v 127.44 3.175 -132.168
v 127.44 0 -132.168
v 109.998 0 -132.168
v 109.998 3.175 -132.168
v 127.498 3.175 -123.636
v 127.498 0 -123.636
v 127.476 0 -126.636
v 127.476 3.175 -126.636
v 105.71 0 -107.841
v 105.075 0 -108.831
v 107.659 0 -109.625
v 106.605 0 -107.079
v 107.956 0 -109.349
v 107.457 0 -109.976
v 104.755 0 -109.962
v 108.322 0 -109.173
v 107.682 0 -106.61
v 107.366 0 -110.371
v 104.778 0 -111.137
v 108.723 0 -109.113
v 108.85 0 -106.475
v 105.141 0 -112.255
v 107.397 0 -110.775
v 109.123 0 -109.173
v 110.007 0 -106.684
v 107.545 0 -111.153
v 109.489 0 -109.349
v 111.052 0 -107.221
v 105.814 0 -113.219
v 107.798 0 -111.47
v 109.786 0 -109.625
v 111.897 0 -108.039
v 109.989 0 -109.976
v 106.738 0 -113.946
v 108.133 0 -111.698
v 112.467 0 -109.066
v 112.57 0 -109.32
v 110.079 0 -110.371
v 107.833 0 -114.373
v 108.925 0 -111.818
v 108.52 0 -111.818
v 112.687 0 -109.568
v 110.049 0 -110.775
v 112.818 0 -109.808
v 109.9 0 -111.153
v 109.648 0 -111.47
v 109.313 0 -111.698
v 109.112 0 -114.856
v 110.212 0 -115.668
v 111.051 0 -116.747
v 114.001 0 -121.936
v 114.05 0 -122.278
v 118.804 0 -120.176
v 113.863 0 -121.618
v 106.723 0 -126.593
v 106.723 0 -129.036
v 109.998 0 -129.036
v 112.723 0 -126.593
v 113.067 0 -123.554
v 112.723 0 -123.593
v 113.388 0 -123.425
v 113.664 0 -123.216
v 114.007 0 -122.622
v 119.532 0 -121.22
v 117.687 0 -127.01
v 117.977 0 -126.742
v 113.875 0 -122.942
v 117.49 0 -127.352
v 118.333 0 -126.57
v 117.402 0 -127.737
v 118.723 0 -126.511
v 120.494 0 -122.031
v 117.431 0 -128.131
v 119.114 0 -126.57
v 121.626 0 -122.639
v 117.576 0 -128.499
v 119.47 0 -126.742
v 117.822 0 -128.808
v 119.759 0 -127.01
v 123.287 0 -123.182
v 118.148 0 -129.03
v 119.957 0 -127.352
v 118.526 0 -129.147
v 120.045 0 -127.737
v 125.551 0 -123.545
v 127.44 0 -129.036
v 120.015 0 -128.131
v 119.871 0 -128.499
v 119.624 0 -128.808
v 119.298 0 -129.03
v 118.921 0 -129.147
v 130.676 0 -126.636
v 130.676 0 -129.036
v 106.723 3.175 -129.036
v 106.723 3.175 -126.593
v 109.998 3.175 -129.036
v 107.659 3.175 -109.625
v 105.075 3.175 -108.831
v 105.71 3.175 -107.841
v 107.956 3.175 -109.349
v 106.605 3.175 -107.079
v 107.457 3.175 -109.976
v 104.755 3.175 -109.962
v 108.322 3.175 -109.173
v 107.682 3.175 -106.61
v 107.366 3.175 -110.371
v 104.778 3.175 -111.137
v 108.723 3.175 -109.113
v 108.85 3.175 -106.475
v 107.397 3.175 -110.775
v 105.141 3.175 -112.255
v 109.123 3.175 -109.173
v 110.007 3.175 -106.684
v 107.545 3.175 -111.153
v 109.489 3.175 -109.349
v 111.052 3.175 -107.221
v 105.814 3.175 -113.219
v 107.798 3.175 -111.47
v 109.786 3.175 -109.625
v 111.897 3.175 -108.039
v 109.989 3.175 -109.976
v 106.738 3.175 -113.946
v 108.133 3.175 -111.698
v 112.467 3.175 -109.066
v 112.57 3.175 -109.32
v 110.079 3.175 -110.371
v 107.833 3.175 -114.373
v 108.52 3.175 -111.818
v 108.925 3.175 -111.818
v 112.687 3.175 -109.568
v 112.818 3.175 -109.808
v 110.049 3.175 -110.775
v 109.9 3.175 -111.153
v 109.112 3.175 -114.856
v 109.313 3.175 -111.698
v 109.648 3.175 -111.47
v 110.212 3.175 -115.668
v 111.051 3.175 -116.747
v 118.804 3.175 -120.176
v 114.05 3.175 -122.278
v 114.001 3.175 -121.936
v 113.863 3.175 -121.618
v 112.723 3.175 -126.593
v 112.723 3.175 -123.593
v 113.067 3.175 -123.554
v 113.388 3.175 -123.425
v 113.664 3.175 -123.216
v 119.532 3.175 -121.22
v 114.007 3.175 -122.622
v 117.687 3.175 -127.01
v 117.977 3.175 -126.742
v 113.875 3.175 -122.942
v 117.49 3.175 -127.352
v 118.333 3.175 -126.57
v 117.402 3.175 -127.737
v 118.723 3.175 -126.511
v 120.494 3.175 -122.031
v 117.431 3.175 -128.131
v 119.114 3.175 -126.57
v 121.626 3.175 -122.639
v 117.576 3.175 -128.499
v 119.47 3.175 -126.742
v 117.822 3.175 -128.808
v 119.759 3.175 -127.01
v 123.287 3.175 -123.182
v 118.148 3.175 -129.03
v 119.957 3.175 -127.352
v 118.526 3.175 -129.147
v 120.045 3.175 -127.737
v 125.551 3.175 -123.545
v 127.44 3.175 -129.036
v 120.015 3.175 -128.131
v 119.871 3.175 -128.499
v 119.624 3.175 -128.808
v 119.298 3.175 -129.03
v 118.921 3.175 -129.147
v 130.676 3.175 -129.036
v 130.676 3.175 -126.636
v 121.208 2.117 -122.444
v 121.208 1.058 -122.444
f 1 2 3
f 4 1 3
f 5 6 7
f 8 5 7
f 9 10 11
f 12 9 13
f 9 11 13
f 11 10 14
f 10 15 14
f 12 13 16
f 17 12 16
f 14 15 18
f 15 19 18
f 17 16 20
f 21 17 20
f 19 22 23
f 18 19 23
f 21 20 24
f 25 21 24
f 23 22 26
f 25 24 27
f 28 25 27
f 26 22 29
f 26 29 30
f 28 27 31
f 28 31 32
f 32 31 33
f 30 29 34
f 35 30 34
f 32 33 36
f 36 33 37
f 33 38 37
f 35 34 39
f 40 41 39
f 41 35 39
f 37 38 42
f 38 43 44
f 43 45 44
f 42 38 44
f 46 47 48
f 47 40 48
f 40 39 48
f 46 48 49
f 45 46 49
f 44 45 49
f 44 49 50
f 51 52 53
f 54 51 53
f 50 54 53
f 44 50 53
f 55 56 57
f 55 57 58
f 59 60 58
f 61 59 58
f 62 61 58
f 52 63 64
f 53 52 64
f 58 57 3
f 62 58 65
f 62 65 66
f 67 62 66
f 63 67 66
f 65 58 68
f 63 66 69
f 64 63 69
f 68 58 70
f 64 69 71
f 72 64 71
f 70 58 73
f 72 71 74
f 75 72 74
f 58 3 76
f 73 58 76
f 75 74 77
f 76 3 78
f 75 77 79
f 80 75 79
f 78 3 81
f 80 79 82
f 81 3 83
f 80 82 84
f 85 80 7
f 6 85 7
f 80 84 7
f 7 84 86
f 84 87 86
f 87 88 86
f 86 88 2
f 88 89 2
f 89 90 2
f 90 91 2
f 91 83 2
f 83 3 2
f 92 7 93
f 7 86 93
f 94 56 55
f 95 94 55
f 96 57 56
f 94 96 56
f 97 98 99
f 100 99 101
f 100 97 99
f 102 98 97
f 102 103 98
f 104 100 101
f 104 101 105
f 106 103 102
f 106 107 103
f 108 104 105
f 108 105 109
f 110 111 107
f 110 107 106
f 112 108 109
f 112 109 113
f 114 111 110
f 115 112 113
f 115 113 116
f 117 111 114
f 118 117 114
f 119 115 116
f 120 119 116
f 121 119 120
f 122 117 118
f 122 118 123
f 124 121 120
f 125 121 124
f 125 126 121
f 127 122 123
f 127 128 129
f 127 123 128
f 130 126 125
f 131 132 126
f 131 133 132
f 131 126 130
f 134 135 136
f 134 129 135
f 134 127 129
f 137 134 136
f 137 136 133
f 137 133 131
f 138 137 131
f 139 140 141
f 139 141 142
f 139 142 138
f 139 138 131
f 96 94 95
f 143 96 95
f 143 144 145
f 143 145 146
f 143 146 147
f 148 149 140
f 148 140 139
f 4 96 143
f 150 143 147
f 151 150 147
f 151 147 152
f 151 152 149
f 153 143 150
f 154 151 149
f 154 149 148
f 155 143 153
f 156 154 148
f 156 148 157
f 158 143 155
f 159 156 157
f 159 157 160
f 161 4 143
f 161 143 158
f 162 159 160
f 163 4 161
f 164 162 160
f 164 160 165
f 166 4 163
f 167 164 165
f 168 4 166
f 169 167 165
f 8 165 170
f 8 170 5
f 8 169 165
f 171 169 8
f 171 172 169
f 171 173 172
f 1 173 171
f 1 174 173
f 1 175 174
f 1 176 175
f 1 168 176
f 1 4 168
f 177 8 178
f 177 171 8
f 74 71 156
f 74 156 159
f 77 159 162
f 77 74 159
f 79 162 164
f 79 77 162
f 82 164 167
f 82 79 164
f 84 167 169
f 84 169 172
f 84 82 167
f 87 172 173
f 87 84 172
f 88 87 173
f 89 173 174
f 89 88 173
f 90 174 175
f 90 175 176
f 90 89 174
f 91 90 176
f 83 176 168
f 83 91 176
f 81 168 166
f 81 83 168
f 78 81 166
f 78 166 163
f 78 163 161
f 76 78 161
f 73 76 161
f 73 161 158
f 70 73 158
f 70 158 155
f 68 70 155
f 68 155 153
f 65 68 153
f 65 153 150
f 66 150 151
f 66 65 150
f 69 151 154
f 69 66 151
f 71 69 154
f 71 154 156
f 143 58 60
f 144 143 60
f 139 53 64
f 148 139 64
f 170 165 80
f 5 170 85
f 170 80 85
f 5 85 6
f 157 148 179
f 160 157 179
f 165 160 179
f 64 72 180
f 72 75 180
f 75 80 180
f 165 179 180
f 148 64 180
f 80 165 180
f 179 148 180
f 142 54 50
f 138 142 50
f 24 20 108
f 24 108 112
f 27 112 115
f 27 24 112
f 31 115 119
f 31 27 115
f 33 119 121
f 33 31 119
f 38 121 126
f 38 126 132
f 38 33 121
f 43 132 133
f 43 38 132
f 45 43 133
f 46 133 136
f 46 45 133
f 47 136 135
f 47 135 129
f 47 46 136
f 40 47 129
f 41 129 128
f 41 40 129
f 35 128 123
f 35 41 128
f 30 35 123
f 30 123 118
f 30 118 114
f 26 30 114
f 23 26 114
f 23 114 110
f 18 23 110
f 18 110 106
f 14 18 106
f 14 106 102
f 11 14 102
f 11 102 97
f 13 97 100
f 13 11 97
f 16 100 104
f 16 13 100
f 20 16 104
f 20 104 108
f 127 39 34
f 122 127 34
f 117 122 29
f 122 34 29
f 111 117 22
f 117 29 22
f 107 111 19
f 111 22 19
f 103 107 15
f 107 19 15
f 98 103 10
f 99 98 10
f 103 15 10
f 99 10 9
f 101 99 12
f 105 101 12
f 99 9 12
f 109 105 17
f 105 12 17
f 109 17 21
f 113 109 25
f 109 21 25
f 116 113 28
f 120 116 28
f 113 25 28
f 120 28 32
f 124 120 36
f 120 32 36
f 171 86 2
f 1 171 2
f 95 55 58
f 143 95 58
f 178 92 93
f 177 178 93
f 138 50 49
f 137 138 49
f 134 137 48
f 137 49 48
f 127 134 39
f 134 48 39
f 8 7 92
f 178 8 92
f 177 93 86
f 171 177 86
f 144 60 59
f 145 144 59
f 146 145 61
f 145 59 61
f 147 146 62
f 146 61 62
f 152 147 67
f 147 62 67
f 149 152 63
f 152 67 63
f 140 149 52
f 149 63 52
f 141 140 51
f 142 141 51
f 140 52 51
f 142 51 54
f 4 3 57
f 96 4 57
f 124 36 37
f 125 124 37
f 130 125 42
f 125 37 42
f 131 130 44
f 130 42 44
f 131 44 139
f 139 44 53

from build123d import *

# Parameters (mm, degrees)
SKETCH1_R           = 1.36
SKETCH1_R_2         = 1.3250121
BOSS_EXTRUDE1_DEPTH = 3.175


with BuildPart() as part:
    # Sketch1 → Boss-Extrude1 (new body)
    with BuildSketch(Plane(origin=(0, 0, 0), x_dir=(1, 0, 0), z_dir=(0, 1, 0))):
        with BuildLine():
            Line((112.722877294, 126.593302228), (112.72277638, 123.593222295))
            ThreePointArc((112.72277638, 123.593222295), (113.875226377, 122.941979767), (113.863024117, 121.61830725))
            Line((113.863024117, 121.61830725), (111.050643934, 116.74721322))
            ThreePointArc((111.050643934, 116.74721322), (109.689478532, 115.224141686), (107.832794667, 114.372529579))
            ThreePointArc((107.832794667, 114.372529579), (105.709889346, 107.841486649), (112.467185669, 109.066311194))
            ThreePointArc((112.467185669, 109.066311194), (112.627253492, 109.444515831), (112.817819601, 109.808308371))
            Line((112.817819601, 109.808308371), (118.803678696, 120.175836459))
            add(Edge.make_bspline(
                [(118.803678696, 120.175836459), (120.361778696, 123.269636459), (125.055778696, 123.618636459), (127.497578696, 123.636436459)],
                knots=[0.666666667, 0.666666667, 0.666666667, 0.666666667, 0.708333333, 0.708333333, 0.708333333, 0.708333333], degree=3))
            Line((127.497578696, 123.636436459), (127.475978696, 126.636436459))
            Line((127.475978696, 126.636436459), (130.675779856, 126.636436459))
            Line((130.675779856, 126.636436459), (130.675779856, 129.036436459))
            Line((130.675779856, 129.036436459), (127.440025111, 129.036436459))
            Line((127.440025111, 129.036436459), (127.440025111, 132.168236459))
            Line((127.440025111, 132.168236459), (109.997615958, 132.168236459))
            Line((109.997615958, 132.168236459), (109.997615958, 129.036436459))
            Line((109.997615958, 129.036436459), (106.722915958, 129.036436459))
            Line((106.722915958, 129.036436459), (106.722915958, 126.593302228))
            Line((106.722915958, 126.593302228), (112.722877294, 126.593302228))
        make_face()
        with Locations(Location((108.72260063, 110.472754541, 0), (0, 0, 270))):
            Circle(SKETCH1_R, mode=Mode.SUBTRACT)
        with Locations(Location((118.723210584, 127.836436459, 0), (0, 0, 270))):
            Circle(SKETCH1_R_2, mode=Mode.SUBTRACT)
    extrude(amount=BOSS_EXTRUDE1_DEPTH)


solid = part.part
